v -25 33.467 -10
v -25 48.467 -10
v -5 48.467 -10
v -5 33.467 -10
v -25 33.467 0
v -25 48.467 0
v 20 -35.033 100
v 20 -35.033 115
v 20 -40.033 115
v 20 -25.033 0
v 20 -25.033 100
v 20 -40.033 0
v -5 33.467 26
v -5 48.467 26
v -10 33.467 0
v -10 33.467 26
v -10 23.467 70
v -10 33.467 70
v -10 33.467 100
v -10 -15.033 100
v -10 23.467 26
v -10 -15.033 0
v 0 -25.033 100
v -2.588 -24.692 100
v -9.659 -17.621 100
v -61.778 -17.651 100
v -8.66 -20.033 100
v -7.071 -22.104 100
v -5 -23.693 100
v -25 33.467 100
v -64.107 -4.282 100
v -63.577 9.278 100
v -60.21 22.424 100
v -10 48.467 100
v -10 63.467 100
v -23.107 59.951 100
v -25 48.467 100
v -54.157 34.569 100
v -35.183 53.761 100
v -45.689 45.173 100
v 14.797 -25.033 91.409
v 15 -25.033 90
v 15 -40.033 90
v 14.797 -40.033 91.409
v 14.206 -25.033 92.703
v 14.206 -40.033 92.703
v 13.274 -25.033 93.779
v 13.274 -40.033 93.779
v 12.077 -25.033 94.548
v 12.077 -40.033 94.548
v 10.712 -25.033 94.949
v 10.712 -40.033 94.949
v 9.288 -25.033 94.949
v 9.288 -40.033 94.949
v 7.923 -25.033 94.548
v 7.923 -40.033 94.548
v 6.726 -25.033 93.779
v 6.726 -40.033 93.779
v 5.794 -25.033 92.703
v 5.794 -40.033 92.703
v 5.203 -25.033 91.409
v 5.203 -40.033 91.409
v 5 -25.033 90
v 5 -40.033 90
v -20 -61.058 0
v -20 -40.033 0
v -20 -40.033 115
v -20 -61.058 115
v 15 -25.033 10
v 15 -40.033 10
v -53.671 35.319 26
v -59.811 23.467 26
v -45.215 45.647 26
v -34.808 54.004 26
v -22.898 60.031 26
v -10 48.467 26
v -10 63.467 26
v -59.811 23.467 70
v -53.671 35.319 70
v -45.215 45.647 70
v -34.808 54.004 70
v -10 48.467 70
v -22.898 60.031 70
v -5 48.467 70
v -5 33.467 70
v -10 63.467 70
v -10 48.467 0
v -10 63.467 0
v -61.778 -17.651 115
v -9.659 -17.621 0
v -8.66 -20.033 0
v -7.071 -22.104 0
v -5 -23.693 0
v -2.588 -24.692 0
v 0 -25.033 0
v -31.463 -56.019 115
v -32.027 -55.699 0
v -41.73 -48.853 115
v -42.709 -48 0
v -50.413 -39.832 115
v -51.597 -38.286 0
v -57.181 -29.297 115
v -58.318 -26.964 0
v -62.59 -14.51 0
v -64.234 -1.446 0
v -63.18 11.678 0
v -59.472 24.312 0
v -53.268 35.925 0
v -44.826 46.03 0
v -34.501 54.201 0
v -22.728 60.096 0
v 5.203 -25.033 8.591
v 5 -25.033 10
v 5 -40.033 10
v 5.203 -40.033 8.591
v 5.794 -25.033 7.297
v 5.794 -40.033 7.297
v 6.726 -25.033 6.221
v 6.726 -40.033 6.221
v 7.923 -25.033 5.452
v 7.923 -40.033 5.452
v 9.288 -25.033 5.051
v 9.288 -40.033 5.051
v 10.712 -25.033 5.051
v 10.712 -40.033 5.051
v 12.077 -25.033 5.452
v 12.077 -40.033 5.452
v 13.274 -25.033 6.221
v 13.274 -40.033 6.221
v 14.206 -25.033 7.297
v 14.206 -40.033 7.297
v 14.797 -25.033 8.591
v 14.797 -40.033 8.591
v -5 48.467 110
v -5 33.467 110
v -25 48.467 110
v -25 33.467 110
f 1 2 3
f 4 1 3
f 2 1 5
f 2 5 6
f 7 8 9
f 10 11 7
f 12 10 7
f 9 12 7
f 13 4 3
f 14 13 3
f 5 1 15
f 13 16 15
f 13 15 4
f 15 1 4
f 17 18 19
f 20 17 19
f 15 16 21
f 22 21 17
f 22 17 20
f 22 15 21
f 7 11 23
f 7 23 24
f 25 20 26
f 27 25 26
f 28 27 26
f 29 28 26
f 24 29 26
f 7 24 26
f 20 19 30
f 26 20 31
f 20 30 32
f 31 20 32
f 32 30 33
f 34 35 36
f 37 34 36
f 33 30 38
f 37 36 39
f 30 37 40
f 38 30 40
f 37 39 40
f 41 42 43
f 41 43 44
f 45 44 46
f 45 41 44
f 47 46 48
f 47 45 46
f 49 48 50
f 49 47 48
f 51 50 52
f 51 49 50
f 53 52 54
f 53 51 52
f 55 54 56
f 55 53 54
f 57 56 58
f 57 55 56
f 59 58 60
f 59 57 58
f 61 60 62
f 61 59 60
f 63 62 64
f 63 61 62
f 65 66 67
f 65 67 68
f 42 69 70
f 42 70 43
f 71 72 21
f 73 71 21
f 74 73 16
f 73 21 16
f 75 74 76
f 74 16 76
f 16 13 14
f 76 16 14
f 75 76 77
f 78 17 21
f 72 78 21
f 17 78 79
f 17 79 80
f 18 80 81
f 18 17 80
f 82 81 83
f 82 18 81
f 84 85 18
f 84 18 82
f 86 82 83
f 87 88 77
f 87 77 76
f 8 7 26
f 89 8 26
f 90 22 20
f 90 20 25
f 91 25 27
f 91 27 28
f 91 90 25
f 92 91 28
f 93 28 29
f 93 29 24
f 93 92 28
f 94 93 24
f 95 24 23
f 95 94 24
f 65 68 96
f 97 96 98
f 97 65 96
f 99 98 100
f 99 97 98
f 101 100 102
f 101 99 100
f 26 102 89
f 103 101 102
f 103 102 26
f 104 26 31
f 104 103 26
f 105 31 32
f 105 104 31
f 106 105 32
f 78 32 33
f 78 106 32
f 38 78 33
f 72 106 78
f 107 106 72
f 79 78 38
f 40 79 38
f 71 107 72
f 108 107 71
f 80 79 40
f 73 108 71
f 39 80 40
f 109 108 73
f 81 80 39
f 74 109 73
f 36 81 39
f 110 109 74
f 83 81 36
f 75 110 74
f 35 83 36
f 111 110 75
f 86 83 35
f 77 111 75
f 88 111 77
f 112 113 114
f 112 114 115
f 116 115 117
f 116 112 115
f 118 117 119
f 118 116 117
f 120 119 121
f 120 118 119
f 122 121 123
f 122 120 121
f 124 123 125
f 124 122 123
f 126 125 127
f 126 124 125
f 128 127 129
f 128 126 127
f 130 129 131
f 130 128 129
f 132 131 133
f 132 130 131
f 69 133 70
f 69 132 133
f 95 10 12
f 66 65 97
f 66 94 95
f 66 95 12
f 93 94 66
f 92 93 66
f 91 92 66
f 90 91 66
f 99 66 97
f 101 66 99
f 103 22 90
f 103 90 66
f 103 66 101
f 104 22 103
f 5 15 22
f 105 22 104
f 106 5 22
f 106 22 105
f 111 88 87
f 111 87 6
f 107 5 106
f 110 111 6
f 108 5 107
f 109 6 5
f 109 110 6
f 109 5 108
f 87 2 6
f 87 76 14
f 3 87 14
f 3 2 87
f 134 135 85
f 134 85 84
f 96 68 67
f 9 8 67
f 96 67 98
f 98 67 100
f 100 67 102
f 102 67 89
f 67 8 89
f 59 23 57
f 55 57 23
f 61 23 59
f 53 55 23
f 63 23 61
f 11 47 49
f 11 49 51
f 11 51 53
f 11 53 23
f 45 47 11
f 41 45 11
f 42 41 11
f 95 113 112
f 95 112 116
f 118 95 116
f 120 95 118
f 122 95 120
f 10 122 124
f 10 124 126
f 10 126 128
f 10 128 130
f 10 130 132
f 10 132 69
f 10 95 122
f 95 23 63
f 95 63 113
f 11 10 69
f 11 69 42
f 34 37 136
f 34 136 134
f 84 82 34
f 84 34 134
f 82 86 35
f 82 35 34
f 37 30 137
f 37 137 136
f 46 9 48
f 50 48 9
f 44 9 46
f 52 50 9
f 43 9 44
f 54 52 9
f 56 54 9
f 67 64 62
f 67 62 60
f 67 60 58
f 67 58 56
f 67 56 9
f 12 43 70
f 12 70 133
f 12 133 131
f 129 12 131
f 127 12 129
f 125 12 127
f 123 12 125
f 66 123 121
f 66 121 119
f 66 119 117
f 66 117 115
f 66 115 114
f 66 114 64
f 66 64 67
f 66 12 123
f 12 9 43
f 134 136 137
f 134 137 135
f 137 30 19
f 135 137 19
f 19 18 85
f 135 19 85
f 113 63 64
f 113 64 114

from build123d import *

# Parameters (mm, degrees)
BOSS_EXTRU_1_DEPTH      = 115
ENL_V_START             = -15
ENL_V_MAT_EXTRU_1_DEPTH = 15
BOSS_EXTRU_2_START      = -110
ESQUISSE3_W             = 20
ESQUISSE3_H             = 15
BOSS_EXTRU_2_DEPTH      = 120
ESQUISSE4_W             = 44
ESQUISSE4_H             = 40
ENL_V_MAT_EXTRU_2_DEPTH = 145.095888213
ENL_V_MAT_EXTRU_3_DEPTH = 159.698810645


with BuildPart() as part:
    # Esquisse1 → Boss.-Extru.1 (new body)
    with BuildSketch(Plane.XY):
        with BuildLine():
            Line((-10, 63.467018994), (-10, -15.032981006))
            ThreePointArc((-10, -15.032981006), (-7.071067812, -22.104048818), (0, -25.032981006))
            Line((0, -25.032981006), (20, -25.032981006))
            Line((20, -25.032981006), (20, -40.032981006))
            Line((20, -40.032981006), (-20, -40.032981006))
            Line((-20, -40.032981006), (-20, -61.057861902))
            ThreePointArc((-20, -61.057861902), (-64.043824765, 5.143054489), (-10, 63.467018994))
        make_face()
    extrude(amount=BOSS_EXTRU_1_DEPTH)

    # Esquisse2 → Enlèv. mat.-Extru.1 (cut)
    with BuildSketch(Plane.XY.offset(115).offset(ENL_V_START)):
        with BuildLine():
            Line((20, -35.032981006), (-61.777999904, -17.650530526))
            ThreePointArc((-61.777999904, -17.650530526), (-54.157497427, 34.569176623), (-10, 63.467018994))
            Line((-10, 63.467018994), (-10, -15.032981006))
            ThreePointArc((-10, -15.032981006), (-7.071067812, -22.104048818), (0, -25.032981006))
            Line((0, -25.032981006), (20, -25.032981006))
            Line((20, -25.032981006), (20, -35.032981006))
        make_face()
    extrude(amount=ENL_V_MAT_EXTRU_1_DEPTH, mode=Mode.SUBTRACT)

    # Esquisse3 → Boss.-Extru.2 (add)
    with BuildSketch(Plane.XY.offset(100).offset(BOSS_EXTRU_2_START)):
        with Locations((-15, 40.967018994)):
            Rectangle(ESQUISSE3_W, ESQUISSE3_H)
    extrude(amount=BOSS_EXTRU_2_DEPTH)

    # Esquisse4 → Enlèv. mat.-Extru.2 (cut, through all)
    with BuildSketch(Plane(origin=(-5, 0, 0), x_dir=(0, 0, -1), z_dir=(1, 0, 0))):
        with Locations((-48, 43.467018994)):
            Rectangle(ESQUISSE4_W, ESQUISSE4_H)
    extrude(amount=-ENL_V_MAT_EXTRU_2_DEPTH, mode=Mode.SUBTRACT)

    # Esquisse5 → Enlèv. mat.-Extru.3 (cut, through all)
    with BuildSketch(Plane(origin=(0, -25.032981006, 0), x_dir=(1, 0, 0), z_dir=(0, 1, 0))):
        with BuildLine():
            Line((15, -10), (15, -90))
            ThreePointArc((15, -90), (10, -95), (5, -90))
            Line((5, -90), (5, -10))
            ThreePointArc((5, -10), (10, -5), (15, -10))
        make_face()
    extrude(amount=-ENL_V_MAT_EXTRU_3_DEPTH, mode=Mode.SUBTRACT)


solid = part.part
